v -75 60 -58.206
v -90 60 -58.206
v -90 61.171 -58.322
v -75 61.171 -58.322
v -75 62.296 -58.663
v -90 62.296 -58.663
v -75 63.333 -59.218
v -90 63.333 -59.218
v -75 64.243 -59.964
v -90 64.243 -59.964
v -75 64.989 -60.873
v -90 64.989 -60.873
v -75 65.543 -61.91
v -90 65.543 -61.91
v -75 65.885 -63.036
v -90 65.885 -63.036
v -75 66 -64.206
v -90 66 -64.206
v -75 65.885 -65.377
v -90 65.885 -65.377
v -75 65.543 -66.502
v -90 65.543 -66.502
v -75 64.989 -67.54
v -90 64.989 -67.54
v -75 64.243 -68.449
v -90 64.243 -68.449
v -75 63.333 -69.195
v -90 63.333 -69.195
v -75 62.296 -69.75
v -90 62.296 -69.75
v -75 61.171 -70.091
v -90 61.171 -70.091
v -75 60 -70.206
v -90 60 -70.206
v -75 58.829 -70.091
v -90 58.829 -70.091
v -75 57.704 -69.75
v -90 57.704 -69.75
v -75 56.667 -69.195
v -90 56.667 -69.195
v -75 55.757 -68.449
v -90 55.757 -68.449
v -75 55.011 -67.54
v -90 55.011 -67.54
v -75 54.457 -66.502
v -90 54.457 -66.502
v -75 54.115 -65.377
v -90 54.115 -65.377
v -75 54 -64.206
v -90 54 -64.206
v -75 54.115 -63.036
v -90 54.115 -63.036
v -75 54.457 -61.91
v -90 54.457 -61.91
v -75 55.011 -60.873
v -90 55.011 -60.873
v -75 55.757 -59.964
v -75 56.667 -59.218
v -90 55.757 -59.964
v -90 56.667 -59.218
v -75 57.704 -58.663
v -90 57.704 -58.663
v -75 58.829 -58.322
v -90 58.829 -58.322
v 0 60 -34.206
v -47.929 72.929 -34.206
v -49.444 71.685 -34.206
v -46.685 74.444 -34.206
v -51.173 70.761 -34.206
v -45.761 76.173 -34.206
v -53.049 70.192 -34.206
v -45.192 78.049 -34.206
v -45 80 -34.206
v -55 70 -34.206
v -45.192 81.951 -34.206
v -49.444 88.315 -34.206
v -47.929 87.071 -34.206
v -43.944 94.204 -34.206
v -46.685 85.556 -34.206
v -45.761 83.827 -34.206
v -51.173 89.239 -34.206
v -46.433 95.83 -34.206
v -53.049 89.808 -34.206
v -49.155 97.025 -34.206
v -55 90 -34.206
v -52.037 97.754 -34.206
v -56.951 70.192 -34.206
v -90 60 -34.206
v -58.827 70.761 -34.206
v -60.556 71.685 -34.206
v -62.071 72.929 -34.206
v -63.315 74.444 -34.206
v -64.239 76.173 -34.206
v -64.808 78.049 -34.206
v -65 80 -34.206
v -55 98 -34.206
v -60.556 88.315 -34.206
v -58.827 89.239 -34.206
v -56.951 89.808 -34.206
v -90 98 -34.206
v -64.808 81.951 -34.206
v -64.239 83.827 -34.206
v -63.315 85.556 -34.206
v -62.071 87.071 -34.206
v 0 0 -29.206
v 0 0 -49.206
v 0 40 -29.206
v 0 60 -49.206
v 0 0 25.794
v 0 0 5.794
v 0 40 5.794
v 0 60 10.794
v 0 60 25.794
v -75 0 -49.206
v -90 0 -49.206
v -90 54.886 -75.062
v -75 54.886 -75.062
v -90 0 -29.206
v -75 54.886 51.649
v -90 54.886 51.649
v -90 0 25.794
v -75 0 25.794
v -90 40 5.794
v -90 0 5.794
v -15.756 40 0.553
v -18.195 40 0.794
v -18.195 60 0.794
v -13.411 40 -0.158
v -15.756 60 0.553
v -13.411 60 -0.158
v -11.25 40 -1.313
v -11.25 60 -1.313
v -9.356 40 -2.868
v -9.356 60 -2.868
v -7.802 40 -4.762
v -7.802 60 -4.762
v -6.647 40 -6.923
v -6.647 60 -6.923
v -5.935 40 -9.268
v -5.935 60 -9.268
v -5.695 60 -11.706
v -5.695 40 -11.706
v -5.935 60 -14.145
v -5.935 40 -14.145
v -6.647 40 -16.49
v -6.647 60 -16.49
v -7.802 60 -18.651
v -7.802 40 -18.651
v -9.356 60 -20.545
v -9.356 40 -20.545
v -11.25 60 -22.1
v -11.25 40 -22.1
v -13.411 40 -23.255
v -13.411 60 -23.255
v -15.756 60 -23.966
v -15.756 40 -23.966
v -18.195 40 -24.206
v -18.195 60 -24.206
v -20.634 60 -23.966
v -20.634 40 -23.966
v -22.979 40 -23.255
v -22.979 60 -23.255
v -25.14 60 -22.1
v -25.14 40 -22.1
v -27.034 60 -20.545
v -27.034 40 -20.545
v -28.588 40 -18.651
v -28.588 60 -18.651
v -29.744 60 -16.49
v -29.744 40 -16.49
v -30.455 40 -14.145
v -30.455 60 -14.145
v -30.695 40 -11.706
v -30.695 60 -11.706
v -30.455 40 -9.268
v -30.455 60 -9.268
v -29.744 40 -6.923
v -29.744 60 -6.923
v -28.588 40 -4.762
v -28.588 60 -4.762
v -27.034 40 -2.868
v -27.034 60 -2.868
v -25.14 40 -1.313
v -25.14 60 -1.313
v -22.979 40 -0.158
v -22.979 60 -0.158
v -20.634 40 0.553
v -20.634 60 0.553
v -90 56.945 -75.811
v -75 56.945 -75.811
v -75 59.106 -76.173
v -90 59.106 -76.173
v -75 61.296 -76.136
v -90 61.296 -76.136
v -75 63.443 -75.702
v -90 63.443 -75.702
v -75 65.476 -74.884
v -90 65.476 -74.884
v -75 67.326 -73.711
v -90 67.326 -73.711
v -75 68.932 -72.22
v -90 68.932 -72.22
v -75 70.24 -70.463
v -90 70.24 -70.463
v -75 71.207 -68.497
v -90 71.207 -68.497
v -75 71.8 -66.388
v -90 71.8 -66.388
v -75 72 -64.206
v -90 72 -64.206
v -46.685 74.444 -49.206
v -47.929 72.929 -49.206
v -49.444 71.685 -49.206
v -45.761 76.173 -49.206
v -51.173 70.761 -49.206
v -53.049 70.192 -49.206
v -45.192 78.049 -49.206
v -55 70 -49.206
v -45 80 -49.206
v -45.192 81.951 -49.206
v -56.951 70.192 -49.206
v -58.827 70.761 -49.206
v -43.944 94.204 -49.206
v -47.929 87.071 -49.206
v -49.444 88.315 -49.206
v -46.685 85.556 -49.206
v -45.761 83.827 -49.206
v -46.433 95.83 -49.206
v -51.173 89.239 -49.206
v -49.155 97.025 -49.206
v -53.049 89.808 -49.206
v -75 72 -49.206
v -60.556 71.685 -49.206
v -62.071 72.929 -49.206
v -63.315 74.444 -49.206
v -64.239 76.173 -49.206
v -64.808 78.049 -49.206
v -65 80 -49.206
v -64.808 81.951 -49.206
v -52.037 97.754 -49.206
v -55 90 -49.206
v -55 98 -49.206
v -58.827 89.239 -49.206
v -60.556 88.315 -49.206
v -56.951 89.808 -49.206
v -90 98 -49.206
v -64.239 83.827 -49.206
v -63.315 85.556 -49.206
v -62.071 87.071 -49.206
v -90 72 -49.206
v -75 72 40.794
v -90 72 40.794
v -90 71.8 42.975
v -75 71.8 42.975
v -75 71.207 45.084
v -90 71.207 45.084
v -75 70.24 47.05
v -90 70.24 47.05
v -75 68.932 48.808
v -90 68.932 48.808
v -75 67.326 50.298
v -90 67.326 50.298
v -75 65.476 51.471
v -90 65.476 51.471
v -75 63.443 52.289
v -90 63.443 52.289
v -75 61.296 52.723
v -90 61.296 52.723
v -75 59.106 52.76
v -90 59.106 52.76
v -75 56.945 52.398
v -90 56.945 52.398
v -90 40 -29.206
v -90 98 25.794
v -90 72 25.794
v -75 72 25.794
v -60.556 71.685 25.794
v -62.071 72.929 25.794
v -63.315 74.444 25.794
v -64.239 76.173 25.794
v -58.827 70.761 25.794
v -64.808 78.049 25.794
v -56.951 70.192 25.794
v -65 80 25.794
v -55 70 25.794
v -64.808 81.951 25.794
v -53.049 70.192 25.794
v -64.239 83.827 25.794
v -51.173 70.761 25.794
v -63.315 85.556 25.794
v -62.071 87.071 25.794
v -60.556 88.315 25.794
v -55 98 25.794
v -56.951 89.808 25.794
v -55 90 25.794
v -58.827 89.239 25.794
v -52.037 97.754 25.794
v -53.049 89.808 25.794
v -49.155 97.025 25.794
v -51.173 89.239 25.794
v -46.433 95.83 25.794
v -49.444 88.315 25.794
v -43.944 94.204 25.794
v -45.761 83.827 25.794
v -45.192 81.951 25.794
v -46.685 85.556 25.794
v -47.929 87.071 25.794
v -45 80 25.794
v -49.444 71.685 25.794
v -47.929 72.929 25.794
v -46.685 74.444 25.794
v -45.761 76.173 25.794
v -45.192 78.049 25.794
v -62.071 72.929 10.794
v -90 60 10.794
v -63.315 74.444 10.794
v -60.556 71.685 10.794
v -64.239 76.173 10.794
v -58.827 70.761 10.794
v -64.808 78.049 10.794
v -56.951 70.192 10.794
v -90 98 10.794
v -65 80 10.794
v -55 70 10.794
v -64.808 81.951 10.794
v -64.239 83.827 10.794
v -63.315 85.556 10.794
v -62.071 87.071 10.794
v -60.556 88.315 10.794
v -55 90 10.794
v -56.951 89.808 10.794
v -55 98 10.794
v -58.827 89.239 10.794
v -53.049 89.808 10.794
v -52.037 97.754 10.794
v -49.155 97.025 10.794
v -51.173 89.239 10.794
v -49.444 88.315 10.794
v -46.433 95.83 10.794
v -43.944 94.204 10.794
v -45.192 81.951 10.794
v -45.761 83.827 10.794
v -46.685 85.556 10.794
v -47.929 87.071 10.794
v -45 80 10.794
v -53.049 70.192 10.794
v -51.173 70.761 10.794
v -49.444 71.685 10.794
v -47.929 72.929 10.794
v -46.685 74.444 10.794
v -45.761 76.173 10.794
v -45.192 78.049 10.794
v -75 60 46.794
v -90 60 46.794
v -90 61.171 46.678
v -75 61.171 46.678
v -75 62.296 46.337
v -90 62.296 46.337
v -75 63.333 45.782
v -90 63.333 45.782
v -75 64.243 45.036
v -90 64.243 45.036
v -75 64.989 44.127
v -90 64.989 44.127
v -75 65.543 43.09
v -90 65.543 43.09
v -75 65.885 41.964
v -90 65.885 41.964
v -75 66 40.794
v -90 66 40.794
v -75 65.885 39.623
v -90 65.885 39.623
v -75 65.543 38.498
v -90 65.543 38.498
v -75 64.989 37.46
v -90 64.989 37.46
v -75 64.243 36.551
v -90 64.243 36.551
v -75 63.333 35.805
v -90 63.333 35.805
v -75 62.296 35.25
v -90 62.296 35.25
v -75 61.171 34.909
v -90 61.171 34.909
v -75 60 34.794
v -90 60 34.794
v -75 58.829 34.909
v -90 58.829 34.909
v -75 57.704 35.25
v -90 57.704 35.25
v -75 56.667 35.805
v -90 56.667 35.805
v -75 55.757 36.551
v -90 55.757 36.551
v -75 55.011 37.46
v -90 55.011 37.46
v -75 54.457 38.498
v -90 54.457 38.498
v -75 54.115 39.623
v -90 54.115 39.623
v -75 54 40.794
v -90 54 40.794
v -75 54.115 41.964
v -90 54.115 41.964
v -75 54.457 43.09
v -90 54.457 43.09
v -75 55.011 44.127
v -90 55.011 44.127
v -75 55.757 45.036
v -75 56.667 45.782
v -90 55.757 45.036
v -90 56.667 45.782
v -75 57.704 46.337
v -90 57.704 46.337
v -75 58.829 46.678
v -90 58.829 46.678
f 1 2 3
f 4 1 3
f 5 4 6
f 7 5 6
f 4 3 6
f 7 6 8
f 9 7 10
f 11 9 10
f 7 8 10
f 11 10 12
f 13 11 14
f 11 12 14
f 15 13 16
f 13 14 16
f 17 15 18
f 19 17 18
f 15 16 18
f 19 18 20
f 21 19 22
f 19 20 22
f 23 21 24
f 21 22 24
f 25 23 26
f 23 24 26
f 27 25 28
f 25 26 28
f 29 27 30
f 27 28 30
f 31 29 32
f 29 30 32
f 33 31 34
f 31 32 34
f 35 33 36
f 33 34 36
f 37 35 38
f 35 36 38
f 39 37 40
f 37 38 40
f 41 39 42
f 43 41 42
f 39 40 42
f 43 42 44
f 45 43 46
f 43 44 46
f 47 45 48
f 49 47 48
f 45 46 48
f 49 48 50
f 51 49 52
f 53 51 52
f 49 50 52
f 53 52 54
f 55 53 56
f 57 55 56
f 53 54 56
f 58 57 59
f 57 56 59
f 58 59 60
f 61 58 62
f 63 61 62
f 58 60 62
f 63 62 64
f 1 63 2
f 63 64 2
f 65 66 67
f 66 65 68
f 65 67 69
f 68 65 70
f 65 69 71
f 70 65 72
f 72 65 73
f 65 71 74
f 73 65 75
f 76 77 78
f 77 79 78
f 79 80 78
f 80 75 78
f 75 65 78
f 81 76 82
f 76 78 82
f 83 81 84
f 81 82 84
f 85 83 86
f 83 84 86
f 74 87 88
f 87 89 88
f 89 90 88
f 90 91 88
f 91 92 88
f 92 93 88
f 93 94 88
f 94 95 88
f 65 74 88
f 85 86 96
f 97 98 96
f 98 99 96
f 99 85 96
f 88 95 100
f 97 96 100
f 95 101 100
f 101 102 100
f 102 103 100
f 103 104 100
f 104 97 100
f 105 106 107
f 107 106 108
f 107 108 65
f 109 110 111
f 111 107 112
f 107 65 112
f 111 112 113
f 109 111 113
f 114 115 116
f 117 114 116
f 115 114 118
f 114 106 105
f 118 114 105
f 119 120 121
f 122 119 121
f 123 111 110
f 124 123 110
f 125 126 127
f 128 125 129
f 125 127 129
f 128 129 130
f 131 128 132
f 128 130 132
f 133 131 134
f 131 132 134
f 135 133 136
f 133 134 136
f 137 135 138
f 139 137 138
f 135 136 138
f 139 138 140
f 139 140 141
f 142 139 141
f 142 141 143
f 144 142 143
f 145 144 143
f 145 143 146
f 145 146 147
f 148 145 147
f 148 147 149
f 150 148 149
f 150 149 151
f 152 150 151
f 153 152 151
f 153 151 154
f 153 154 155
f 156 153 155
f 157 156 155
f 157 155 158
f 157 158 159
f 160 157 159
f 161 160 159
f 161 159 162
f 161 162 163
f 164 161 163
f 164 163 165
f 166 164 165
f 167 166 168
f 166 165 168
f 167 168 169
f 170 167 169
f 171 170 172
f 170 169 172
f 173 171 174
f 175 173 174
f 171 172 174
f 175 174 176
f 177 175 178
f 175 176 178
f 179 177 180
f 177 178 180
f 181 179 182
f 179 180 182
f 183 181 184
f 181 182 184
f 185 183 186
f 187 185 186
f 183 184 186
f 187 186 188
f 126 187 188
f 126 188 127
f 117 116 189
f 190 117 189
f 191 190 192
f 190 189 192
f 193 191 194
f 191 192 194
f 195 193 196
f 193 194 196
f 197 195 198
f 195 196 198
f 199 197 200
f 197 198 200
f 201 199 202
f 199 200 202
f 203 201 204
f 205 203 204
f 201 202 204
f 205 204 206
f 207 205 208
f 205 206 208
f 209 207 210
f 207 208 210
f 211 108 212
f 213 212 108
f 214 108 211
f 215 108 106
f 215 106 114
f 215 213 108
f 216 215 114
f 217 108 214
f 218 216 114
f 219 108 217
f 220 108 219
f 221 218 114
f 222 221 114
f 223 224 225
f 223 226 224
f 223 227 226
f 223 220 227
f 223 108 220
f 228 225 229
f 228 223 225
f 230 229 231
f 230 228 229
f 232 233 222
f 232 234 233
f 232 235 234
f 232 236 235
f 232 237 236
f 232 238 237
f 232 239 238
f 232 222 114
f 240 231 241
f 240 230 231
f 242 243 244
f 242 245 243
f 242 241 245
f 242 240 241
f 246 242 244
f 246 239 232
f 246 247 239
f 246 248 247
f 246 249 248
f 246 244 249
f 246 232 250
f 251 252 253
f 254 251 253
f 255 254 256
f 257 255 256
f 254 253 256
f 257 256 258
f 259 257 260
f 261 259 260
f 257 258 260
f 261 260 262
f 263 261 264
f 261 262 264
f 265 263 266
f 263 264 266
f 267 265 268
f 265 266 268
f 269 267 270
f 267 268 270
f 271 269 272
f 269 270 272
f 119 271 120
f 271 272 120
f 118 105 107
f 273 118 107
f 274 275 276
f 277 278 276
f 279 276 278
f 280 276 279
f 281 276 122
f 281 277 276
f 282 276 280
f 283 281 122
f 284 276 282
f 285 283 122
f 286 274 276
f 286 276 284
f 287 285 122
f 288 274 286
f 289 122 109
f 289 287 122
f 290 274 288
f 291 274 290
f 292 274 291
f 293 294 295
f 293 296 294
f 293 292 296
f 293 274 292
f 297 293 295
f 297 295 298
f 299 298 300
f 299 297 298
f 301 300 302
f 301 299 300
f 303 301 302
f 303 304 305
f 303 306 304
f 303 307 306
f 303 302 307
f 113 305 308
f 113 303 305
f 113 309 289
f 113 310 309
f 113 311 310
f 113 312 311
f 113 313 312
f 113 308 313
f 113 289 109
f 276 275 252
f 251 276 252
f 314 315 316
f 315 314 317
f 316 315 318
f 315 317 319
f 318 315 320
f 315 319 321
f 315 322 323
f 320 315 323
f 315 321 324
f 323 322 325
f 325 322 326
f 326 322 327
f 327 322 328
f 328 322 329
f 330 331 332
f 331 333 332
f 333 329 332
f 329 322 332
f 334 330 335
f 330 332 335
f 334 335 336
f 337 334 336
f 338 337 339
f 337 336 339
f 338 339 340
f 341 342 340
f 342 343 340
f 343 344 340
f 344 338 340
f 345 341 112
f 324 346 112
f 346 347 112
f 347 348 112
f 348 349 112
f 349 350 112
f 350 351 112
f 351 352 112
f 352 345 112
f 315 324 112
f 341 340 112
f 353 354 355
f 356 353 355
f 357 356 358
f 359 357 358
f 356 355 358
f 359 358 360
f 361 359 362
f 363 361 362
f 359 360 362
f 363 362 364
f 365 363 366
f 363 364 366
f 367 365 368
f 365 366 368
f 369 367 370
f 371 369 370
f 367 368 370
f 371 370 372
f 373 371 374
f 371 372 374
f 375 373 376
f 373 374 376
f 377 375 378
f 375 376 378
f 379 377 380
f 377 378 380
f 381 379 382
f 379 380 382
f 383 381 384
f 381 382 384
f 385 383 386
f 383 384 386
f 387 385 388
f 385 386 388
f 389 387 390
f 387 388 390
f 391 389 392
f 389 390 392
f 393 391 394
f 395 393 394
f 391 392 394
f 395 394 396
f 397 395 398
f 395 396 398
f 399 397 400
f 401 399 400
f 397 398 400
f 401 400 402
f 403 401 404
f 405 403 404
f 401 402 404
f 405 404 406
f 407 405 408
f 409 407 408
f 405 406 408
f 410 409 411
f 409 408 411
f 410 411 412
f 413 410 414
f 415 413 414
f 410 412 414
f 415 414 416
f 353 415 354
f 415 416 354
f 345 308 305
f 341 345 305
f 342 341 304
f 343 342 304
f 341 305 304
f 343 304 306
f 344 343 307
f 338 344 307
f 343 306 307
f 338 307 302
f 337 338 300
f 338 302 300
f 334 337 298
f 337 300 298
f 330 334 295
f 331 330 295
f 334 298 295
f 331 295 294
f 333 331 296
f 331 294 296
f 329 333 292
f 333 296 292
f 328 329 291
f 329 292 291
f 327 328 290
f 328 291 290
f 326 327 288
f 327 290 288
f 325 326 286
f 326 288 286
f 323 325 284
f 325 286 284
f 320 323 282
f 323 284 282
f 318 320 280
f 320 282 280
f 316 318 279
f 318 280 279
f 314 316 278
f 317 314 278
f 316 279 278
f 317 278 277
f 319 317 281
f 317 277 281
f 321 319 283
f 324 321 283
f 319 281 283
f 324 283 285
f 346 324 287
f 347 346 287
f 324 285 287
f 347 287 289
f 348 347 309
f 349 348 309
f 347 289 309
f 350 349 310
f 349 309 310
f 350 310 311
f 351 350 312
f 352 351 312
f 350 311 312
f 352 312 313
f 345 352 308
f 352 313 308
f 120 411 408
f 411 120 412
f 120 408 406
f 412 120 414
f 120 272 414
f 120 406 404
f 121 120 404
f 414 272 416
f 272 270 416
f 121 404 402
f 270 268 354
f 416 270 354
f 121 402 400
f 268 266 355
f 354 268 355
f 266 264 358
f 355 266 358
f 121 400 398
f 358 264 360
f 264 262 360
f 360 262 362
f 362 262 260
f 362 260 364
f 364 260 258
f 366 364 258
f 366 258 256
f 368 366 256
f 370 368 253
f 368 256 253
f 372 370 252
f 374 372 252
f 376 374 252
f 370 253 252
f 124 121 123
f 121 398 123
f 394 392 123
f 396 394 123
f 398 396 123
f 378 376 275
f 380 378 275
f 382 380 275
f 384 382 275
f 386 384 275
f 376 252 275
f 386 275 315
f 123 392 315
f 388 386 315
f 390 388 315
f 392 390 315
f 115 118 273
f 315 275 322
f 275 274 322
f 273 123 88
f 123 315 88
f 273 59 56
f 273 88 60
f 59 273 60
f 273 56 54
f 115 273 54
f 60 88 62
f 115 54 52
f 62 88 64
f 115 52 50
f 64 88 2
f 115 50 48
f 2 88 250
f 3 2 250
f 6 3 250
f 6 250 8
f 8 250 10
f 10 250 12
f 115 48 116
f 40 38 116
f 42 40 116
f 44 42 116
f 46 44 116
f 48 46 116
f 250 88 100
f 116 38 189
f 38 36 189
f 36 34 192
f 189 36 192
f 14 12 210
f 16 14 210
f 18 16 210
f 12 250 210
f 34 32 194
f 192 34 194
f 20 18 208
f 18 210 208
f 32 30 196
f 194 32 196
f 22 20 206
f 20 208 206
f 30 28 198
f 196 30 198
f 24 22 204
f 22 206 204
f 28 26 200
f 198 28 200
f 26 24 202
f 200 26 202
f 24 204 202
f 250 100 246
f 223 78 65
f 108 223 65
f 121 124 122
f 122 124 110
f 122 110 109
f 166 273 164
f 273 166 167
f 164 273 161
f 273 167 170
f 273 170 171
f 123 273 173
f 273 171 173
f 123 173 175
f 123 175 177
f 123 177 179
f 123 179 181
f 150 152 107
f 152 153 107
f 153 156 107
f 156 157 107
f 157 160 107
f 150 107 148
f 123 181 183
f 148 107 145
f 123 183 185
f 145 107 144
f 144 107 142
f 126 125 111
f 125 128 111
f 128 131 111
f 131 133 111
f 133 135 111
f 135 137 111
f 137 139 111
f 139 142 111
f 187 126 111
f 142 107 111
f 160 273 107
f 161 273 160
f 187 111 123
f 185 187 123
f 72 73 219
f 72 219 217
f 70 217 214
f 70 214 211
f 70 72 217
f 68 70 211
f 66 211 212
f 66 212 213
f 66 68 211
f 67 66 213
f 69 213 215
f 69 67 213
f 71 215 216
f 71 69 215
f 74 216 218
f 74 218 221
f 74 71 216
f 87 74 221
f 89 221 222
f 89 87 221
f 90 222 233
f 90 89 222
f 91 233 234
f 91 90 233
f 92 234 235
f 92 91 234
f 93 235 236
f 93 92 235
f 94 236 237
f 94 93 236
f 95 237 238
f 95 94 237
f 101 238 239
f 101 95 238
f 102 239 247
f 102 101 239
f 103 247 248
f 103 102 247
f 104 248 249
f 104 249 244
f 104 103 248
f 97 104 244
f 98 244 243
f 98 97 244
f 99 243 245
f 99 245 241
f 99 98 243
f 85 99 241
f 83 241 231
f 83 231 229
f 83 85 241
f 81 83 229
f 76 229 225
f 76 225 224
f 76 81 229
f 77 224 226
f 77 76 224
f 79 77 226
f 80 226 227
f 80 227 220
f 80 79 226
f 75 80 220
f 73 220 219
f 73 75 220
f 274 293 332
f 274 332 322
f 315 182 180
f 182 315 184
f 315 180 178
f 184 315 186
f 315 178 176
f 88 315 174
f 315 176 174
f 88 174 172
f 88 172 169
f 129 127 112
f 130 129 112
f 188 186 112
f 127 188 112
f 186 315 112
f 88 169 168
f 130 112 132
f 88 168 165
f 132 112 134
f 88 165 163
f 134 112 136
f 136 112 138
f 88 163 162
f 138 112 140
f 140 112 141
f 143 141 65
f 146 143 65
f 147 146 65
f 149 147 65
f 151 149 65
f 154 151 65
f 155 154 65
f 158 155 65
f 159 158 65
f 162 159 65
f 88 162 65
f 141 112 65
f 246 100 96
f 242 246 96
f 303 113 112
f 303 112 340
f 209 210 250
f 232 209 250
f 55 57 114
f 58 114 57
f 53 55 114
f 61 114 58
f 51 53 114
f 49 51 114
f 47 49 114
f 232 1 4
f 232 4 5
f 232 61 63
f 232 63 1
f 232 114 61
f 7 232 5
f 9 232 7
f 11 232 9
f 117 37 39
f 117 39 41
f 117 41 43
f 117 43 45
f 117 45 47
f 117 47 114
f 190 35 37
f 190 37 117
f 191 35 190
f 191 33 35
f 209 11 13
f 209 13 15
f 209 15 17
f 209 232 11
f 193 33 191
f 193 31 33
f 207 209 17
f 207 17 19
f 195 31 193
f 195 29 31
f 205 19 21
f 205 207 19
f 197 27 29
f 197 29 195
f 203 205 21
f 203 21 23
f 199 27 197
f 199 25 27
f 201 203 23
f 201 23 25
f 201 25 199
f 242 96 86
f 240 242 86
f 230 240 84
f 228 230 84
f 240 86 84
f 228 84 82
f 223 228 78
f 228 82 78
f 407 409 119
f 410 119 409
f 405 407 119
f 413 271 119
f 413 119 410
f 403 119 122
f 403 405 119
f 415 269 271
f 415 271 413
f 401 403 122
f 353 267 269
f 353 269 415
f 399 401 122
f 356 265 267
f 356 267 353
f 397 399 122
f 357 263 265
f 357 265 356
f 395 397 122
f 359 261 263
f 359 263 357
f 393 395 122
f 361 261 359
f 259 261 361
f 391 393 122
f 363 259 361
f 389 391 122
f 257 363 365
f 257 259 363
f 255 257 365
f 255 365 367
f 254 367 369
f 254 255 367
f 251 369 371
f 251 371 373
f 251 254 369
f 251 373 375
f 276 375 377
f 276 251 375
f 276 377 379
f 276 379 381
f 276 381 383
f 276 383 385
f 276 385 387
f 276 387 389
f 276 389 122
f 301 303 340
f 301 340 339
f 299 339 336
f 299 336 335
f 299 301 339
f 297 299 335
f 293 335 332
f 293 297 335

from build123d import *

# Parameters (mm, degrees)
BOSS_EXTRUDE1_DEPTH = 90
SKETCH2_R           = 10
BOSS_EXTRUDE2_DEPTH = 15
BOSS_EXTRUDE3_START = -15
SKETCH3_R           = 10
BOSS_EXTRUDE3_DEPTH = 15
SKETCH5_R           = 6
BOSS_EXTRUDE4_DEPTH = 15
SKETCH6_R           = 6
BOSS_EXTRUDE5_DEPTH = 15
SKETCH7_R           = 12.5
CUT_EXTRUDE1_DEPTH  = 133.315560912


with BuildPart() as part:
    # Sketch1 → Boss-Extrude1 (new body)
    with BuildSketch(Plane(origin=(0, 0, 0), x_dir=(0, 0, -1), z_dir=(1, 0, 0))):
        Polygon((-25.793650794, 0), (-25.793650794, 60), (49.206349206, 60), (49.206349206, 0), (29.206349206, 0), (29.206349206, 40), (-5.793650794, 40), (-5.793650794, 0), align=None)
    extrude(amount=-BOSS_EXTRUDE1_DEPTH)

    # Sketch2 → Boss-Extrude2 (add)
    with BuildSketch(Plane.XY.offset(25.793650794)):
        with BuildLine():
            Line((0, 60), (-43.943887784, 94.204308595))
            ThreePointArc((-43.943887784, 94.204308595), (-49.155239727, 97.024652048), (-55, 98))
            Line((-55, 98), (-90, 98))
            Line((-90, 98), (-90, 60))
            Line((-90, 60), (0, 60))
        make_face()
        with Locations((-55, 80)):
            Circle(SKETCH2_R, mode=Mode.SUBTRACT)
    extrude(amount=-BOSS_EXTRUDE2_DEPTH)

    # Sketch3 → Boss-Extrude3 (add)
    with BuildSketch(Plane(origin=(0, 0, -49.206349206), x_dir=(-1, 0, 0), z_dir=(0, 0, -1)).offset(BOSS_EXTRUDE3_START)):
        with BuildLine():
            Line((0, 60), (90, 60))
            Line((90, 60), (90, 98))
            Line((90, 98), (55, 98))
            ThreePointArc((55, 98), (49.155239727, 97.024652048), (43.943887784, 94.204308595))
            Line((43.943887784, 94.204308595), (0, 60))
        make_face()
        with Locations(Location((55, 80, 0), (0, 0, 180))):
            Circle(SKETCH3_R, mode=Mode.SUBTRACT)
    extrude(amount=BOSS_EXTRUDE3_DEPTH)

    # Sketch5 → Boss-Extrude4 (add)
    with BuildSketch(Plane.ZY.offset(90)):
        with BuildLine():
            Line((25.793650794, 0), (25.793650794, 72))
            Line((25.793650794, 72), (40.793650794, 72))
            ThreePointArc((40.793650794, 72), (50.926944716, 66.427779888), (51.649414605, 54.886059047))
            Line((51.649414605, 54.886059047), (25.793650794, 0))
        make_face()
        with Locations((40.793650794, 60)):
            Circle(SKETCH5_R, mode=Mode.SUBTRACT)
    extrude(amount=-BOSS_EXTRUDE4_DEPTH)

    # Sketch6 → Boss-Extrude5 (add)
    with BuildSketch(Plane.ZY.offset(90)):
        with BuildLine():
            Line((-49.206349206, 0), (-75.062113018, 54.886059047))
            ThreePointArc((-75.062113018, 54.886059047), (-74.339643129, 66.427779888), (-64.206349206, 72))
            Line((-64.206349206, 72), (-49.206349206, 72))
            Line((-49.206349206, 72), (-49.206349206, 0))
        make_face()
        with Locations((-64.206349206, 60)):
            Circle(SKETCH6_R, mode=Mode.SUBTRACT)
    extrude(amount=-BOSS_EXTRUDE5_DEPTH)

    # Sketch7 → Cut-Extrude1 (cut, through all)
    with BuildSketch(Plane(origin=(0, 60, 0), x_dir=(1, 0, 0), z_dir=(0, 1, 0))):
        with Locations(Location((-18.195009626, 11.706349206, 0), (0, 0, 270))):
            Circle(SKETCH7_R)
    extrude(amount=-CUT_EXTRUDE1_DEPTH, mode=Mode.SUBTRACT)


solid = part.part
